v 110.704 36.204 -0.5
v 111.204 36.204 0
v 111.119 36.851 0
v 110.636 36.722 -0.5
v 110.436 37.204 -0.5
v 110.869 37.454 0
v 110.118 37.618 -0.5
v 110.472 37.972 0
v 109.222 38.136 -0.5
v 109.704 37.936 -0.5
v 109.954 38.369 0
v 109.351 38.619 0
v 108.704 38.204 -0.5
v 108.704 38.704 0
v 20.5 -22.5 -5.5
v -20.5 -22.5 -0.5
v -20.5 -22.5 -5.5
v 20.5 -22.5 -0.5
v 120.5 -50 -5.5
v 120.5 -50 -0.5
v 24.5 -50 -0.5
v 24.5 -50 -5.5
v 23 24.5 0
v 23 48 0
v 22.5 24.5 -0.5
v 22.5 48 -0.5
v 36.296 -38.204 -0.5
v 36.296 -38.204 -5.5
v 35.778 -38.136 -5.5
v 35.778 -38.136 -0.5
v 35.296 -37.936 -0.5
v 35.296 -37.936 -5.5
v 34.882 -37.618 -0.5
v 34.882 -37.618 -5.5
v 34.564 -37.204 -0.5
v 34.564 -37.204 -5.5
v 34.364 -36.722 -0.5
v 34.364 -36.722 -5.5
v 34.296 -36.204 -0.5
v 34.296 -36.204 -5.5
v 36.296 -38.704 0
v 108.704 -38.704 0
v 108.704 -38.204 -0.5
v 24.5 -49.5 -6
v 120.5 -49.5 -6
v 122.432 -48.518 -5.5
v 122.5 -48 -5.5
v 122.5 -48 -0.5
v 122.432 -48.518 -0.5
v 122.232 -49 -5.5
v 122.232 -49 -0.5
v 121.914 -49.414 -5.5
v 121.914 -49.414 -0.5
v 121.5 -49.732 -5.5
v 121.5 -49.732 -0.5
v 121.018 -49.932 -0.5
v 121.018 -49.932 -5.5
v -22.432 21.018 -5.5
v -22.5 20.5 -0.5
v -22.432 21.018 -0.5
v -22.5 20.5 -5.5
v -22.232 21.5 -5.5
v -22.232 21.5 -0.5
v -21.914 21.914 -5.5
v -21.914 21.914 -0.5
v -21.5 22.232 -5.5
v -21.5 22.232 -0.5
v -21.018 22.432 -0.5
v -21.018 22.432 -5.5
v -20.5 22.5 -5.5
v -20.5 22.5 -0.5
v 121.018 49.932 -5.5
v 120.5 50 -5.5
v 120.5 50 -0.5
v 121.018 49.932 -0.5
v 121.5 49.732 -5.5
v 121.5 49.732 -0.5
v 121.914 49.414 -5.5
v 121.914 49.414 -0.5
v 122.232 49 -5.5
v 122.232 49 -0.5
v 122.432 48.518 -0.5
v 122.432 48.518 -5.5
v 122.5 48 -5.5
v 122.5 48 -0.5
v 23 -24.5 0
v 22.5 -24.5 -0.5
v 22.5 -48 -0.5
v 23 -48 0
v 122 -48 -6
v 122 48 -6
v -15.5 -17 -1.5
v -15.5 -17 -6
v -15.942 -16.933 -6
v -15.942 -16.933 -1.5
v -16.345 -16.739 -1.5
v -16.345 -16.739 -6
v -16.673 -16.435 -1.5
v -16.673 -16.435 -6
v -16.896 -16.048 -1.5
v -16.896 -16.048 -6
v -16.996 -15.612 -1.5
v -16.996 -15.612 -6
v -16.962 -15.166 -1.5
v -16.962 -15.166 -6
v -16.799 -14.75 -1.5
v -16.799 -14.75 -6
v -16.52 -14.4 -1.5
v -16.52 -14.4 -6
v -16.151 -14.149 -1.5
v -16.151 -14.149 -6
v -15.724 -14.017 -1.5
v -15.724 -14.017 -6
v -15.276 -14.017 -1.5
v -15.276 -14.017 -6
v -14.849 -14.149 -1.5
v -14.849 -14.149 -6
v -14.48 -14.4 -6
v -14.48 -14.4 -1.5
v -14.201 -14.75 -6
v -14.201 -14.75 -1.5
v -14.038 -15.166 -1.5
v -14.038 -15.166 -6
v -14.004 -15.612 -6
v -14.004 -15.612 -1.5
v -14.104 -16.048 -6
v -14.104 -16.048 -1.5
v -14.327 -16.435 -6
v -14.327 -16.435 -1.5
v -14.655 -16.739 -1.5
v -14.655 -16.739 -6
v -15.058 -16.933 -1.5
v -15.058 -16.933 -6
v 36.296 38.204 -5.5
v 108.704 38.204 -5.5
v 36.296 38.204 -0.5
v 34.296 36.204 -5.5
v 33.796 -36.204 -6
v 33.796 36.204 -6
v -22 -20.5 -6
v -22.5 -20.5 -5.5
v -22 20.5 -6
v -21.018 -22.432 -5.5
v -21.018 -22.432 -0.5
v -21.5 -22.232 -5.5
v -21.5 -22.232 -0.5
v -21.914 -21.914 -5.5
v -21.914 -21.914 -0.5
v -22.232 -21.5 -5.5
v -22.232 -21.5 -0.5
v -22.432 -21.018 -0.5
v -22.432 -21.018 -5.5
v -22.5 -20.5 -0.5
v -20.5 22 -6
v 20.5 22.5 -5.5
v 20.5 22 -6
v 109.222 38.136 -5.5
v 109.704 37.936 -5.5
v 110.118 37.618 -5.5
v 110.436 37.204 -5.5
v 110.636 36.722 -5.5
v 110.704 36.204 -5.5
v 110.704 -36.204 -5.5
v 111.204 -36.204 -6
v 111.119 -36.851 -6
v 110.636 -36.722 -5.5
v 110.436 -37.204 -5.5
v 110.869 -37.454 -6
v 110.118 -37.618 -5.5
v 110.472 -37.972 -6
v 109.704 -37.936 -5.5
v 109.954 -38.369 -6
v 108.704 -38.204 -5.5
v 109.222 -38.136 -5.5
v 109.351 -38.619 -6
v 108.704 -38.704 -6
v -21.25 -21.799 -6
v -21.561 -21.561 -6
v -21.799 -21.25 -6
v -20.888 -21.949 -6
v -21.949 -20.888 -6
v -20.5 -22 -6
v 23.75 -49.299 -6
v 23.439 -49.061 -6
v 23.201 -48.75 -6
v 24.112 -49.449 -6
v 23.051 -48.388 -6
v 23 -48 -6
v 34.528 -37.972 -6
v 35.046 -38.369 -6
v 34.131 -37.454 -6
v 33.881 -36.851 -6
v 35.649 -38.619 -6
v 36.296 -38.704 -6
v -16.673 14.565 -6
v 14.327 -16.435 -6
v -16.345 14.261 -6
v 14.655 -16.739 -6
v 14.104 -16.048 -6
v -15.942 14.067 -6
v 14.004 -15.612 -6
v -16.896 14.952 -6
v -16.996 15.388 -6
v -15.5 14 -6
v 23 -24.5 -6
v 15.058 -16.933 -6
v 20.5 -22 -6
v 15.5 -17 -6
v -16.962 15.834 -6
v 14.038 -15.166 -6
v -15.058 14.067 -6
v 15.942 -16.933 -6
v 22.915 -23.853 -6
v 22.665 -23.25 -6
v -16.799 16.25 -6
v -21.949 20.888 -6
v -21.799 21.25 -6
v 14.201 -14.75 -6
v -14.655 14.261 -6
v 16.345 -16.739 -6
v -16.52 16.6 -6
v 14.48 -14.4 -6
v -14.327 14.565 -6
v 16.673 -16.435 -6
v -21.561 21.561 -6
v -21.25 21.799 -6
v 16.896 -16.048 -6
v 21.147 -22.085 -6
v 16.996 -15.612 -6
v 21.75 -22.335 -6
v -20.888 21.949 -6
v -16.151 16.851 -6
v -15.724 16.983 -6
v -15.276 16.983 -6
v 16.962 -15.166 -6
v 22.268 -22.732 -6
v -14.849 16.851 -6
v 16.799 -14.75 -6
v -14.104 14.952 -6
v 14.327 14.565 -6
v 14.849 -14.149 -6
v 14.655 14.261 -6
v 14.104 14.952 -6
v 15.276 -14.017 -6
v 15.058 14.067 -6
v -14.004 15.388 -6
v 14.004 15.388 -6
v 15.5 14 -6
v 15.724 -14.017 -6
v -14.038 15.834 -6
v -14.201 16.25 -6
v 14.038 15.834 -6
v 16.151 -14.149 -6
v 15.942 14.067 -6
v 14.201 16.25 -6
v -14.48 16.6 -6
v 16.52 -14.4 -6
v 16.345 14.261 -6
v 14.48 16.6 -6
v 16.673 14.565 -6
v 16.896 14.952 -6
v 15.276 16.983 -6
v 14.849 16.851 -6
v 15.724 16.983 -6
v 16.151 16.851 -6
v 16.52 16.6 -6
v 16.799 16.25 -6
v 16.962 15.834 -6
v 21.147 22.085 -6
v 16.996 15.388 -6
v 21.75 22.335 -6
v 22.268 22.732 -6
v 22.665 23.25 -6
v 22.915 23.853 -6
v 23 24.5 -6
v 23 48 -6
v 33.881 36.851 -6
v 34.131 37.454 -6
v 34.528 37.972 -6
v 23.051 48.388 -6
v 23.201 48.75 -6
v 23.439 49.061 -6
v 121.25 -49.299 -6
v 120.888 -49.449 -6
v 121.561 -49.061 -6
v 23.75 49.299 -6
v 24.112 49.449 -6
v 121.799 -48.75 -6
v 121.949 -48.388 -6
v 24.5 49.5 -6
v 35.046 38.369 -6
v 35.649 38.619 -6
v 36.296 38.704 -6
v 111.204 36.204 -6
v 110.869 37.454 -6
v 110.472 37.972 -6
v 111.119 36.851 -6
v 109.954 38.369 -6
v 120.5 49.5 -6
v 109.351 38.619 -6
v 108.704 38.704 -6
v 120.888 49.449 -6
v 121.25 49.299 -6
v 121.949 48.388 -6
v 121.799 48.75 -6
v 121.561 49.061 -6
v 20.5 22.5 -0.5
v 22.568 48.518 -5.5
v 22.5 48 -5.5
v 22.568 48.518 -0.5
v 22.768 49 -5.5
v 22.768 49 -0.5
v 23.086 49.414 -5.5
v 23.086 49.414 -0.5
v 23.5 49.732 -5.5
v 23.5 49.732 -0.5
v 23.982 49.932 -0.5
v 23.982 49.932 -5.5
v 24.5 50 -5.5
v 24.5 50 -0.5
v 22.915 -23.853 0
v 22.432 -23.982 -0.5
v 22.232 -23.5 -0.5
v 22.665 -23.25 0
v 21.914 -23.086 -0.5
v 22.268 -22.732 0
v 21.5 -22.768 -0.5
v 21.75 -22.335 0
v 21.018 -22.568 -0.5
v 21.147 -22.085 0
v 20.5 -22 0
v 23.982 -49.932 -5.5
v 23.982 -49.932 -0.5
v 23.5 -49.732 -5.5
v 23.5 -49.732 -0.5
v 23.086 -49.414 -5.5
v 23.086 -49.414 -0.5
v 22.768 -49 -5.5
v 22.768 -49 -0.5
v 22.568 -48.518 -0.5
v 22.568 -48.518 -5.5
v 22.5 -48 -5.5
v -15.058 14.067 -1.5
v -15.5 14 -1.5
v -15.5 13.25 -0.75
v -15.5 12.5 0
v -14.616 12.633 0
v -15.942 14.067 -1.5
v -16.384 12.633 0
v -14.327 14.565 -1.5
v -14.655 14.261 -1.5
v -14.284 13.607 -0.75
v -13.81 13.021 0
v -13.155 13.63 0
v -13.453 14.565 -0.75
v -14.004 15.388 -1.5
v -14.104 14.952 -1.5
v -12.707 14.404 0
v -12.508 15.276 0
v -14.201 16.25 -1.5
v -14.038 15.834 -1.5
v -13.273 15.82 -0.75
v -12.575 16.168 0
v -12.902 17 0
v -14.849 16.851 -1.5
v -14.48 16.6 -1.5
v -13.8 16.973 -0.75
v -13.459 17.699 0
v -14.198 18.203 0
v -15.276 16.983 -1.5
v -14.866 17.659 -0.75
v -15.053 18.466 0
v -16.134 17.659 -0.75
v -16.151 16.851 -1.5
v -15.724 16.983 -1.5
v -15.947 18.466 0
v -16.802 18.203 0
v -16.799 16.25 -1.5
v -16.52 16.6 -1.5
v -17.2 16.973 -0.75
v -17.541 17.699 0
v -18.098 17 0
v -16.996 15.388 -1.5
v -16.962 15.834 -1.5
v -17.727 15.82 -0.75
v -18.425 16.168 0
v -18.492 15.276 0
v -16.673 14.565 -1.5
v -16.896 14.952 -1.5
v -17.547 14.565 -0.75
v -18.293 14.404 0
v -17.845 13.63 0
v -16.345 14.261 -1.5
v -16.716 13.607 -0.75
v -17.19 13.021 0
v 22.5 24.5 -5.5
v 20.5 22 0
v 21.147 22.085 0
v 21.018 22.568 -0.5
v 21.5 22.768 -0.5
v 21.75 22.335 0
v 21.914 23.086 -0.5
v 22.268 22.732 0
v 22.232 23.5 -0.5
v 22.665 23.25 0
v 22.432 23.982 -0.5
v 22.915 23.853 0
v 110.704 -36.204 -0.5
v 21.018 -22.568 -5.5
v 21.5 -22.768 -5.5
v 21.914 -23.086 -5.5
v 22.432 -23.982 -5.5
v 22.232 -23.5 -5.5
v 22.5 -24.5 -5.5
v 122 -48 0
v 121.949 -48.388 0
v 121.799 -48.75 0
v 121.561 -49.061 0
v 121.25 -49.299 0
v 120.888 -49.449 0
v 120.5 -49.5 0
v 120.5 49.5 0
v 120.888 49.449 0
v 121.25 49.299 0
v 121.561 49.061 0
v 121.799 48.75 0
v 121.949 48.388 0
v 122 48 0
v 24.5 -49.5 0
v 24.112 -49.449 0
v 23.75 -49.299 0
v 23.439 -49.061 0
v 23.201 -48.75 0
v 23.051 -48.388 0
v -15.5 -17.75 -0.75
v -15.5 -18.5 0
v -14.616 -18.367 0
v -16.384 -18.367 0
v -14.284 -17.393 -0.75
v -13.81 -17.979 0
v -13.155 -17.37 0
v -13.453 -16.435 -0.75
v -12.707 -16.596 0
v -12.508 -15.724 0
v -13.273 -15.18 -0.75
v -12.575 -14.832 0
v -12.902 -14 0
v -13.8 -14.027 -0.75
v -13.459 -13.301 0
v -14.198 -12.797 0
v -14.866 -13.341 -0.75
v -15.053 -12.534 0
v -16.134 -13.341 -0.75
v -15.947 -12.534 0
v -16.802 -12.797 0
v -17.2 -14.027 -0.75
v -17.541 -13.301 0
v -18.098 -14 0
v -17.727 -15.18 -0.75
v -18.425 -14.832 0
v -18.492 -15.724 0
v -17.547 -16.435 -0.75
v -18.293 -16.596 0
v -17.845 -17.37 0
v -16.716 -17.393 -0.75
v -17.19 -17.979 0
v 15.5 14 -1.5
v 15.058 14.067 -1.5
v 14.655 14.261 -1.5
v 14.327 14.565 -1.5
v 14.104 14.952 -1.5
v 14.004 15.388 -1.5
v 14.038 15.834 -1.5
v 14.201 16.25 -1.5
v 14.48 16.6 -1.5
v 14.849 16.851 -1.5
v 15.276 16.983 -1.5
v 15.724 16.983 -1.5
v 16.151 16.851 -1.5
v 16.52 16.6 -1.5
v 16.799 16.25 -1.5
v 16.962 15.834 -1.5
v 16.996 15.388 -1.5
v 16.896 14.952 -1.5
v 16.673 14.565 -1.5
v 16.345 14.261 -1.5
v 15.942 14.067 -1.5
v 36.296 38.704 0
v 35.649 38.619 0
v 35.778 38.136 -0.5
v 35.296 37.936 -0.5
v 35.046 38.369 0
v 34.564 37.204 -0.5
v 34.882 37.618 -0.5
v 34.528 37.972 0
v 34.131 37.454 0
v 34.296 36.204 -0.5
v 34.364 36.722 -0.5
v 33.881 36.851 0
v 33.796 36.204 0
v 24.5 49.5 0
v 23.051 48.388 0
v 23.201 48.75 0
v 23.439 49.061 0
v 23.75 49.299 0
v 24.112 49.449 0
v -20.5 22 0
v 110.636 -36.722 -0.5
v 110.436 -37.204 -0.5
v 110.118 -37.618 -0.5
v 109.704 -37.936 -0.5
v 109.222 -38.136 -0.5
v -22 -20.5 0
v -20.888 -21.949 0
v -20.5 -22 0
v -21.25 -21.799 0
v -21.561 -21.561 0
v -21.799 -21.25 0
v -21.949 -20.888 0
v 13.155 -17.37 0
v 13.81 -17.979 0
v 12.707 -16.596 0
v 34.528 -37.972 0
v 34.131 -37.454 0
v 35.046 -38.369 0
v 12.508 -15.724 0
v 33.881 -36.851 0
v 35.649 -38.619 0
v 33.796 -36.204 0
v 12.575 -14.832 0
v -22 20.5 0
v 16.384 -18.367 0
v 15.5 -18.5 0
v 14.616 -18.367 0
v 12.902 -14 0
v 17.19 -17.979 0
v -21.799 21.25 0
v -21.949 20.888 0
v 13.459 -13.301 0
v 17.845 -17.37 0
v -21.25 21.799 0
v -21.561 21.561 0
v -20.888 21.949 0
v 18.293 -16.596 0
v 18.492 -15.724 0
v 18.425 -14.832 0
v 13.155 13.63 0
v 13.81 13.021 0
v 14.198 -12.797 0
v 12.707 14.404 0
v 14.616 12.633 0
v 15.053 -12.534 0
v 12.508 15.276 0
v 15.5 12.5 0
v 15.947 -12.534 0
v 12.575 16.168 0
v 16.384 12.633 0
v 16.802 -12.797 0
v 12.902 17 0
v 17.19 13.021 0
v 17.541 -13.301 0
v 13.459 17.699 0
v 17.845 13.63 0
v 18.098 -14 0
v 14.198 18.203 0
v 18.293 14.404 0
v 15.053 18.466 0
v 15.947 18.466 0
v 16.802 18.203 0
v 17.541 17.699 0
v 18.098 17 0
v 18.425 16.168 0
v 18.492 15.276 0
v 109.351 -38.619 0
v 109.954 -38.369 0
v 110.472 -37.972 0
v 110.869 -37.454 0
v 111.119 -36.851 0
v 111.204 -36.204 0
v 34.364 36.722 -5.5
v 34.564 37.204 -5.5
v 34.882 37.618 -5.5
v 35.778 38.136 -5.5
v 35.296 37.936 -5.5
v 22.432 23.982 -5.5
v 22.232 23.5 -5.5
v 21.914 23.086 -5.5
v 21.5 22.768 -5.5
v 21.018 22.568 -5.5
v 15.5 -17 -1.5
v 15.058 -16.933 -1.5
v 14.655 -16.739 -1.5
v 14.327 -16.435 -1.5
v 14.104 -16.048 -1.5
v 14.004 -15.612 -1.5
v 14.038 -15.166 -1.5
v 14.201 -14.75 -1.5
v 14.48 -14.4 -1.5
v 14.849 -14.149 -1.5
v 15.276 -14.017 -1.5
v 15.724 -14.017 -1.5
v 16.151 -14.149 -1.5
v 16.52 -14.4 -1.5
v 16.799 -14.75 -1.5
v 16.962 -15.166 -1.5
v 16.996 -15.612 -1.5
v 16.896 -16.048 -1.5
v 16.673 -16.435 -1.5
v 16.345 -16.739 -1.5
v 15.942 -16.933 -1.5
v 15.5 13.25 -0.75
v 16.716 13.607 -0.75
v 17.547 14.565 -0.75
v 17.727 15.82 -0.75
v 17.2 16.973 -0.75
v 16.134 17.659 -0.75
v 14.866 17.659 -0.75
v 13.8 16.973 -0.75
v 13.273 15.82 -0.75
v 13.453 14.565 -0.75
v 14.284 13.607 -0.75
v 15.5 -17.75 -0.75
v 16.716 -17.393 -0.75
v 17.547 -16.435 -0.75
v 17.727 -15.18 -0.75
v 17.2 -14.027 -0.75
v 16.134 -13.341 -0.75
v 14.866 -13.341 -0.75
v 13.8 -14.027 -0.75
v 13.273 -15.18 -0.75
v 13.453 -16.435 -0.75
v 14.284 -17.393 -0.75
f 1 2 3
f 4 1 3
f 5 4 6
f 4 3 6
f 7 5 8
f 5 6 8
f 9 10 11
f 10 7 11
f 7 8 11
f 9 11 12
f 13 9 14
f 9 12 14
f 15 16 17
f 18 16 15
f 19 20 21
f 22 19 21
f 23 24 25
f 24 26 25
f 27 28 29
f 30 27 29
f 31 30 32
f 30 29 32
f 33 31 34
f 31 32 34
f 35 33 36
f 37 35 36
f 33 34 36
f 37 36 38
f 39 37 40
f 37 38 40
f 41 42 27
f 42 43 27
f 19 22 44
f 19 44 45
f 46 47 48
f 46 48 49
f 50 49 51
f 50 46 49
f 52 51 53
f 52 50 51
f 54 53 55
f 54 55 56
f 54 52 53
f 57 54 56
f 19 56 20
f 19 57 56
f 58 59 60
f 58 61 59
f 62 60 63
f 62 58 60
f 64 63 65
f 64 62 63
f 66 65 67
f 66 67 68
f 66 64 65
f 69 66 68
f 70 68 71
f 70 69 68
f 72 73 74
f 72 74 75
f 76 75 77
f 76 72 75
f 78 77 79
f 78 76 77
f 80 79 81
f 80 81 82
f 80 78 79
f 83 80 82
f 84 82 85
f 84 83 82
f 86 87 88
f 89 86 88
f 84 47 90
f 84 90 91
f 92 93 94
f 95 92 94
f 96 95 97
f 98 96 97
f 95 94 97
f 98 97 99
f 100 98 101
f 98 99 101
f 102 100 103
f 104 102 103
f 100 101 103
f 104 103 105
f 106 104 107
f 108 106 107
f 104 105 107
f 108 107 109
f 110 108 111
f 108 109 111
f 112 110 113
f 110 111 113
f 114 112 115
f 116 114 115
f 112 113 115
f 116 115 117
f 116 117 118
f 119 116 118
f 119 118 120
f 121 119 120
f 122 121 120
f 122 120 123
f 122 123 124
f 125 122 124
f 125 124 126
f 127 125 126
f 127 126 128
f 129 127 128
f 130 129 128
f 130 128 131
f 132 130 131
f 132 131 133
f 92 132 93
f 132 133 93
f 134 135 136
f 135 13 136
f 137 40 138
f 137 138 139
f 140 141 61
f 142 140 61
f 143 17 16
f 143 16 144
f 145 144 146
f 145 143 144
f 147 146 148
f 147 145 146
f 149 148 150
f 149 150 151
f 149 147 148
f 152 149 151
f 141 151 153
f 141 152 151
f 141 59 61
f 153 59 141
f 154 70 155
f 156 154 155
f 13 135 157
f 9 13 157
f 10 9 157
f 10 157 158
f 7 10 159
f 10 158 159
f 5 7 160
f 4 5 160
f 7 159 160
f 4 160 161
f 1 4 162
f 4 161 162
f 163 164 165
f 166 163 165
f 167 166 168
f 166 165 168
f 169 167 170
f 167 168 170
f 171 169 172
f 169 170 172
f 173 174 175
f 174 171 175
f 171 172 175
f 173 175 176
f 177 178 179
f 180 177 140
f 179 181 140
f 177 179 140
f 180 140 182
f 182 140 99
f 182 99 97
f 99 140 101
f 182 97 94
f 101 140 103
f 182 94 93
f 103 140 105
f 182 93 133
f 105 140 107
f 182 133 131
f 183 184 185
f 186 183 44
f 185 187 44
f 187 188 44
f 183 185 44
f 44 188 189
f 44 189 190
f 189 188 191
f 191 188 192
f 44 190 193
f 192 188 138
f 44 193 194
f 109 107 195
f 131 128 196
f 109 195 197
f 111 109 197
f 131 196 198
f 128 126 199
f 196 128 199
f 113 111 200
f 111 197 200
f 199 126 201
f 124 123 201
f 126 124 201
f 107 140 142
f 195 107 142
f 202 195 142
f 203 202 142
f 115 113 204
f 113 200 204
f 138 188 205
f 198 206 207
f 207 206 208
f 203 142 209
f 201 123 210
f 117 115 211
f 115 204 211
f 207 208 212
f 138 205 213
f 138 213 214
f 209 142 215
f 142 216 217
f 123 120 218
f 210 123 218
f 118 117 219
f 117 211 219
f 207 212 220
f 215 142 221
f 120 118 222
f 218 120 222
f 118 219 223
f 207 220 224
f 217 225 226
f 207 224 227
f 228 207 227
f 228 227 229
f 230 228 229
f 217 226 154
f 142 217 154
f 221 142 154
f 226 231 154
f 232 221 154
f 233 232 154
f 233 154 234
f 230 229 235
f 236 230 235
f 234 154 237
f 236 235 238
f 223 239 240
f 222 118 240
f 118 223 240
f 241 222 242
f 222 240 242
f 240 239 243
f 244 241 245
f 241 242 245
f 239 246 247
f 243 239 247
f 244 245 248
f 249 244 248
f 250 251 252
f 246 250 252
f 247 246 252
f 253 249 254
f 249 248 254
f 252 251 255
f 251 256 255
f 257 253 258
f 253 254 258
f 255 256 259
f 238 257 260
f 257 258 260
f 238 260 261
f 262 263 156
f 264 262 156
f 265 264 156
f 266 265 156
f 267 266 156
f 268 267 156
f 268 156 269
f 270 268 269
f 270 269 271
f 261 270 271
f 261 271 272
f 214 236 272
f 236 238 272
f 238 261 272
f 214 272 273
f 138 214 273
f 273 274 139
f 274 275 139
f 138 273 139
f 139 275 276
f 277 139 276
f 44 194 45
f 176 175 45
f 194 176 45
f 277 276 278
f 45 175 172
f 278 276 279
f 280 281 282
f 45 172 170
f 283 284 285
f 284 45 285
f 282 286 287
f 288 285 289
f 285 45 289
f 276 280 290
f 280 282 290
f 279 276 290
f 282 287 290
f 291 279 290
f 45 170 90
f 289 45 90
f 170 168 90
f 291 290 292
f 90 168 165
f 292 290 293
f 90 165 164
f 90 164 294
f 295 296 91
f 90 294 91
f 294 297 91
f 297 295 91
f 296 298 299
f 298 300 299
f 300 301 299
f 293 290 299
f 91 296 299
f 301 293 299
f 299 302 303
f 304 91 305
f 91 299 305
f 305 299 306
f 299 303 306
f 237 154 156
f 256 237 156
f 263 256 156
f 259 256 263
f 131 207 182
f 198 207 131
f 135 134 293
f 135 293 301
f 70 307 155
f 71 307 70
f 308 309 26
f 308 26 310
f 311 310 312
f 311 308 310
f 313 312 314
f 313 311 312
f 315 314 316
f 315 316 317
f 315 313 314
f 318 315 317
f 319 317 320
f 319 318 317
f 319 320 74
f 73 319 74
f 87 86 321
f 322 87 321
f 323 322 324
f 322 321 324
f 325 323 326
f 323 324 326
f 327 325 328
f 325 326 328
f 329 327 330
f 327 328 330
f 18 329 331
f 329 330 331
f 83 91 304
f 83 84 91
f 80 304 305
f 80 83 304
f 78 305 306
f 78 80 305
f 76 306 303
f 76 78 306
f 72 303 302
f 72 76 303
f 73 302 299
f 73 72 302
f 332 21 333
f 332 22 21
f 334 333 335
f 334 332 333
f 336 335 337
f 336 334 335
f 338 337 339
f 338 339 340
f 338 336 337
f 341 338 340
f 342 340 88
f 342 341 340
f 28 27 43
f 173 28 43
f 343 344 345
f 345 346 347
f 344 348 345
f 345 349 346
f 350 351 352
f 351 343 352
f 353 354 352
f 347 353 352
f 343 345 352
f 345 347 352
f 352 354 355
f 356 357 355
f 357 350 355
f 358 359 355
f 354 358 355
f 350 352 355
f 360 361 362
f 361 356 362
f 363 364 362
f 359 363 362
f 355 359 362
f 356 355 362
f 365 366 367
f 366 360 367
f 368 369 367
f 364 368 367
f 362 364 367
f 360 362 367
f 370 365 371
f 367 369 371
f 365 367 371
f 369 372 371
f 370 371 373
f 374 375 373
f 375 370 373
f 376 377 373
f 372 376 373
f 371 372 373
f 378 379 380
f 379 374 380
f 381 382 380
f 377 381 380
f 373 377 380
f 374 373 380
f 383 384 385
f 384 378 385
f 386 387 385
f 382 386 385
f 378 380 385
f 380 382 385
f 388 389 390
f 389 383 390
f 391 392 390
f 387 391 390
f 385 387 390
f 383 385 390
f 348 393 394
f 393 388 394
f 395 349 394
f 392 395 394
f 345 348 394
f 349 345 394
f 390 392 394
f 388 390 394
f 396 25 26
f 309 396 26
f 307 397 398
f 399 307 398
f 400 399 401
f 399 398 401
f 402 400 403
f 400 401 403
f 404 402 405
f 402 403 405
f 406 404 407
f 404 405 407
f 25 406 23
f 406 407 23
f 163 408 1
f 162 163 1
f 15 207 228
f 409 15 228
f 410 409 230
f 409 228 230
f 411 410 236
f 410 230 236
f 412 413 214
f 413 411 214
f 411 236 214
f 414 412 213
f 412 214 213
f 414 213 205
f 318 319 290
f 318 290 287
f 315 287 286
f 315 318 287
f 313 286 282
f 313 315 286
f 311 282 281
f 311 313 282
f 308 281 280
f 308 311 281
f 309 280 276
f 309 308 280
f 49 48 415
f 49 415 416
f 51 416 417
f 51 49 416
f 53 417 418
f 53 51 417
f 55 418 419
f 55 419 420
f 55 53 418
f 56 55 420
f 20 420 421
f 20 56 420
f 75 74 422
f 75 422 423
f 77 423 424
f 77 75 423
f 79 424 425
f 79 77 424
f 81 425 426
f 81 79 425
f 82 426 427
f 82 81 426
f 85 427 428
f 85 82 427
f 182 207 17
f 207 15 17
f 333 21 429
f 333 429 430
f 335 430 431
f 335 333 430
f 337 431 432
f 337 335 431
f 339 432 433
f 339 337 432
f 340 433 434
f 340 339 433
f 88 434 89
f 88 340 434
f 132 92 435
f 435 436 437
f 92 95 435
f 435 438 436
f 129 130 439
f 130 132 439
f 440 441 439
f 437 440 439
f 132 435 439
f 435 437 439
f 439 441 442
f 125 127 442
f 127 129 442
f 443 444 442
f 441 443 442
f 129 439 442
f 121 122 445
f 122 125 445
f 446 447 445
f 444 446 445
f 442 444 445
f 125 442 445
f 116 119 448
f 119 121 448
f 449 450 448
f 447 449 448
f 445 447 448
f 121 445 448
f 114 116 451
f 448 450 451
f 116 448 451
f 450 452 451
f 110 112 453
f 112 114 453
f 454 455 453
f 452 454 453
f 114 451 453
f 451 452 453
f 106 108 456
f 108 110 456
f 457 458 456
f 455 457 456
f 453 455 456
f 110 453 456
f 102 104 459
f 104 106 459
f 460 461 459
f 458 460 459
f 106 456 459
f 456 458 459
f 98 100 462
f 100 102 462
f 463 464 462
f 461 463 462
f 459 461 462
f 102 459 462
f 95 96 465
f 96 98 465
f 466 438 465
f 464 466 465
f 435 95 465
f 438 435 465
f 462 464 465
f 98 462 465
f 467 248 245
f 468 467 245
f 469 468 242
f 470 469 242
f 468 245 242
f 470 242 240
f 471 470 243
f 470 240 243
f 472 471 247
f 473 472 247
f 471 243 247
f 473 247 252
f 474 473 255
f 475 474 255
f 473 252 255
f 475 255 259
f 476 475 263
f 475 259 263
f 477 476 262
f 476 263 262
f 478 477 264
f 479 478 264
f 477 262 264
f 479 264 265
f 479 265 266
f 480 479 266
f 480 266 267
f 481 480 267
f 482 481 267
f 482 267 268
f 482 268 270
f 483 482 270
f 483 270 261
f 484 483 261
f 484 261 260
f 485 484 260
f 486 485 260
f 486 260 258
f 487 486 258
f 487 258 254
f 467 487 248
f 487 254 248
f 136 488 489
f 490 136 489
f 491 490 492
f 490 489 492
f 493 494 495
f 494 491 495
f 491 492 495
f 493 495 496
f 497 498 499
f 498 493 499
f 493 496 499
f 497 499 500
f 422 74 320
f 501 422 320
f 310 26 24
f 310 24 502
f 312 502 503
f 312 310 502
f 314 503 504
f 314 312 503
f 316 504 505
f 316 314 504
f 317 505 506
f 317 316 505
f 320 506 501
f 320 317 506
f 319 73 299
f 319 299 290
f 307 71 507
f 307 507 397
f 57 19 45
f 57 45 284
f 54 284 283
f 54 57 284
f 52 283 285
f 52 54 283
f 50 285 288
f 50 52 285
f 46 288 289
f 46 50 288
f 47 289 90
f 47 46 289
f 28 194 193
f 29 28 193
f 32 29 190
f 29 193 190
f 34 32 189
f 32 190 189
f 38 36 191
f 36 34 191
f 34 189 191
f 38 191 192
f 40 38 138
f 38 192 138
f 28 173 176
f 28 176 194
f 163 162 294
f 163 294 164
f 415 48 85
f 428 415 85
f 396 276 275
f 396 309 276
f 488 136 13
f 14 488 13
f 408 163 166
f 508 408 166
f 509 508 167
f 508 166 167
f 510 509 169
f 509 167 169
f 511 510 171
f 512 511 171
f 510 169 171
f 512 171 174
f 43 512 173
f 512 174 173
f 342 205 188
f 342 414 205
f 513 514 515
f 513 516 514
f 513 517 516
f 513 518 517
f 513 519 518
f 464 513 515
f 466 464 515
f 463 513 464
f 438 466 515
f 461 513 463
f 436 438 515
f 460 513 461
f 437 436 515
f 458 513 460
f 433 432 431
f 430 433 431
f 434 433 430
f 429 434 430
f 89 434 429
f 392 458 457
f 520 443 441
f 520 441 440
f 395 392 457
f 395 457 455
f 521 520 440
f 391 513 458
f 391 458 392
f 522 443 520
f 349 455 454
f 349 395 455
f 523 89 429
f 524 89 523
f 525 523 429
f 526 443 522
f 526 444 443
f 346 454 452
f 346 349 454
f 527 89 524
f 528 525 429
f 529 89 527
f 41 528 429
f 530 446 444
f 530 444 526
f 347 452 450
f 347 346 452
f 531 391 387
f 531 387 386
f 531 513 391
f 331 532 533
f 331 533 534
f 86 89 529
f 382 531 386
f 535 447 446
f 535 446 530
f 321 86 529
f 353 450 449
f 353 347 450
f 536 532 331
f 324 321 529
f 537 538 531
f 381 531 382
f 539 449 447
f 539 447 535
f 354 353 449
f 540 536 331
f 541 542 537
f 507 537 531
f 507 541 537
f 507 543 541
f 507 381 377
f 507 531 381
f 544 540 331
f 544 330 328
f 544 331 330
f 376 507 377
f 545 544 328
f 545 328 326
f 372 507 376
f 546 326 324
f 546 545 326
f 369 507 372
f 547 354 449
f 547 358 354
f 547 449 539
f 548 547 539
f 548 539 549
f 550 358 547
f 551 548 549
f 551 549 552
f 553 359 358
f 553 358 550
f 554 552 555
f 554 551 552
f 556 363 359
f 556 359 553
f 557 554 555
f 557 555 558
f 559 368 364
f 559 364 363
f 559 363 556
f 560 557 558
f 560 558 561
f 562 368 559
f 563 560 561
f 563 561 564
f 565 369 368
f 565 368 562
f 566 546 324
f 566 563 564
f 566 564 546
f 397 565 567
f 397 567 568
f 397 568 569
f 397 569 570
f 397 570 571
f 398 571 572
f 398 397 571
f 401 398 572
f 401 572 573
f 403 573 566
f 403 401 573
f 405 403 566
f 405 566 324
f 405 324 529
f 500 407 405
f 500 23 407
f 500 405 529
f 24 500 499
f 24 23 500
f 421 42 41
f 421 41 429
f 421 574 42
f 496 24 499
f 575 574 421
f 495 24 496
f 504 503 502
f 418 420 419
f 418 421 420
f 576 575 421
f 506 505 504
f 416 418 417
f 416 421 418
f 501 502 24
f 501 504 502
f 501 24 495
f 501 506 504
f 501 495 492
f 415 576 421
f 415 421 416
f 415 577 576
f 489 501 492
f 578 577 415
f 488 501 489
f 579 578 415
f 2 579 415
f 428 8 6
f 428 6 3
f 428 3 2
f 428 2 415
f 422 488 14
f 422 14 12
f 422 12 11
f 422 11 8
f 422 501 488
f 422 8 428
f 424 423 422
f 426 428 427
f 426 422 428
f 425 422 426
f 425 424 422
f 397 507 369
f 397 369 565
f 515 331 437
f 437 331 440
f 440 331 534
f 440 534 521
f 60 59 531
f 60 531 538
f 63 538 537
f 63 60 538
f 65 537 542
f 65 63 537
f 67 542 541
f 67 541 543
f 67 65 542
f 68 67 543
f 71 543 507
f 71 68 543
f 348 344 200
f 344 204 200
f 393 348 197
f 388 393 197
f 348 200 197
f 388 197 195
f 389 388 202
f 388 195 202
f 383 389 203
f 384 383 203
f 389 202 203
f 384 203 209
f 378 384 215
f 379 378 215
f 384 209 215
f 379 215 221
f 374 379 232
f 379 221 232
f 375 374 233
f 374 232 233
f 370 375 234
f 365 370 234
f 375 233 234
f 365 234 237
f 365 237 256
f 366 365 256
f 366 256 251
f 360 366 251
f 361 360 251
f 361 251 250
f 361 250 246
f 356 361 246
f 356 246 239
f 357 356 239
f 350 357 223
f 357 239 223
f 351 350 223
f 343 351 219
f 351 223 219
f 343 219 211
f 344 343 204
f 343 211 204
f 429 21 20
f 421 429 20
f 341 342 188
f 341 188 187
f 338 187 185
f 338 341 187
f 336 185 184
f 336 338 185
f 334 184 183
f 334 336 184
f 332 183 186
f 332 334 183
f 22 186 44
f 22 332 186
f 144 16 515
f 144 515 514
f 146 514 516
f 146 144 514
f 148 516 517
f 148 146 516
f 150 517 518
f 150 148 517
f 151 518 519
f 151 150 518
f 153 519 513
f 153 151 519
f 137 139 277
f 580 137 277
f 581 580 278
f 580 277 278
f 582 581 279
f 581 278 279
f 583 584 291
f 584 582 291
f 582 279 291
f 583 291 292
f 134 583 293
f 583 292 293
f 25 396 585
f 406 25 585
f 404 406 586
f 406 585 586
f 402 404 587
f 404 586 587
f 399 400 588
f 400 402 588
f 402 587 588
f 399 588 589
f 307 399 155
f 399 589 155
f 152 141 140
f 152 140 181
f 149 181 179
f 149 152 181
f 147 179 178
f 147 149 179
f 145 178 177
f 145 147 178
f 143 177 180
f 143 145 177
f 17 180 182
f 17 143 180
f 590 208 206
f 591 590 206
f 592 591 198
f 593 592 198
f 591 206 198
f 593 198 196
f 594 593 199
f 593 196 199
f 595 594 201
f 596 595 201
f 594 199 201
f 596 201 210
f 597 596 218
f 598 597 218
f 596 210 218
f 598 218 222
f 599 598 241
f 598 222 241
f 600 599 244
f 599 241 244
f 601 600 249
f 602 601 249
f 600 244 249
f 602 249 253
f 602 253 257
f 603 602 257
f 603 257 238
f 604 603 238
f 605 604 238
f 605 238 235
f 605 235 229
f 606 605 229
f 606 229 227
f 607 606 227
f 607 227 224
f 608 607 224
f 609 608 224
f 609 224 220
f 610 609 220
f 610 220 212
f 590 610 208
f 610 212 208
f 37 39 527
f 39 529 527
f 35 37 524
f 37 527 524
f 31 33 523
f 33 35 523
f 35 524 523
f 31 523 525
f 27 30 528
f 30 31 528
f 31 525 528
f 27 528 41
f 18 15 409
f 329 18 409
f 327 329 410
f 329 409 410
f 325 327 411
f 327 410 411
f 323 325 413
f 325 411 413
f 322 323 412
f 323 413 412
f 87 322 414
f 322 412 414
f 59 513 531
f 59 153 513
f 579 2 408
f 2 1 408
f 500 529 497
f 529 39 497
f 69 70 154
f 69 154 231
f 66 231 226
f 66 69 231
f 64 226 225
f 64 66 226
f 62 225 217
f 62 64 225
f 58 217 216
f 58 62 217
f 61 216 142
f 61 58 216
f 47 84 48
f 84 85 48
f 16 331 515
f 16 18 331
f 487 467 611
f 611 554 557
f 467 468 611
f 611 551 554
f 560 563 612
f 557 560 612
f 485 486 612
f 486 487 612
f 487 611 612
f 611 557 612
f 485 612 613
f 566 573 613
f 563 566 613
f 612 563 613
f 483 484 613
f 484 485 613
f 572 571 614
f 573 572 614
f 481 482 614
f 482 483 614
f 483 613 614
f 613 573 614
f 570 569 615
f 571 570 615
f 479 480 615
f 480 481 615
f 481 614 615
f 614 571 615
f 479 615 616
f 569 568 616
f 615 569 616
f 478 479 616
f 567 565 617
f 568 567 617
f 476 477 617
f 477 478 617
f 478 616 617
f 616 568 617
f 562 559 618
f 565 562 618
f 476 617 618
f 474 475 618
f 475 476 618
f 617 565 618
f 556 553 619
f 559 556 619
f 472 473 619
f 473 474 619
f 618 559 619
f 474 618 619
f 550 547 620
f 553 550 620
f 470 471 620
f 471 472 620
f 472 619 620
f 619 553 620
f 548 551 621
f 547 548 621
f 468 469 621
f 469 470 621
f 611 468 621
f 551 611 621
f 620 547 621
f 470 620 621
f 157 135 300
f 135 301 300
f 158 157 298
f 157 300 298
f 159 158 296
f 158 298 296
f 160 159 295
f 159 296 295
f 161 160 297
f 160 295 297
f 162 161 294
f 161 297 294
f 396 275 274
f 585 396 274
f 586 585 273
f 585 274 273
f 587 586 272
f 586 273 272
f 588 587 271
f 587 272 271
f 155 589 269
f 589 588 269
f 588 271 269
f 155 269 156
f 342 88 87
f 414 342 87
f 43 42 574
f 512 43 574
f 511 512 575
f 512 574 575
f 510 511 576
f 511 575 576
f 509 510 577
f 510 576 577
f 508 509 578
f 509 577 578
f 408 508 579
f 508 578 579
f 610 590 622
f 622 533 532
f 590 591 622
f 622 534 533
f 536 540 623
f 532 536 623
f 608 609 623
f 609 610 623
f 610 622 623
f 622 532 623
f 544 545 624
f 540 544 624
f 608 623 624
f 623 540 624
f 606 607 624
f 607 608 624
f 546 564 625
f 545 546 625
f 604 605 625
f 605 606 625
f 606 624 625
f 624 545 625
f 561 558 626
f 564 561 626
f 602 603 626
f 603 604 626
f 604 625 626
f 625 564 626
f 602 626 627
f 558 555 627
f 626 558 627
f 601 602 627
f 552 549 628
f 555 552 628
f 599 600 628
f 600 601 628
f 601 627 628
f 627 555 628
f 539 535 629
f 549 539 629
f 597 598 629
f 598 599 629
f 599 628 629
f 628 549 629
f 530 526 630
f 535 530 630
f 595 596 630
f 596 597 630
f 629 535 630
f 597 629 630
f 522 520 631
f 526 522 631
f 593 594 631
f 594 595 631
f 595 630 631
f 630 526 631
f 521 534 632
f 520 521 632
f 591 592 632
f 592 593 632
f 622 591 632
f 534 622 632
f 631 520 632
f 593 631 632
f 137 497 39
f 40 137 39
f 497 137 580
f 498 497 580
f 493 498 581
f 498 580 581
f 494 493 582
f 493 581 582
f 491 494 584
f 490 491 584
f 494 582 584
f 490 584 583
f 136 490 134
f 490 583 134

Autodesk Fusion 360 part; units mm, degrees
sketch "Cuadrado 100x100" plane through (0, 0, 0) normal (0, 0, 1) x (1, 0, 0)
  line L0 (50, -50) -> (-50, -50)
  line L1 (-50, -50) -> (-50, 50)
  line L2 (-50, 50) -> (50, 50)
  line L3 (50, 50) -> (50, -50)
  line L4 (50, -50) -> (-50, 50) construction
  line L5 (-50, -50) -> (50, 50) construction
  dimension "d1" = 100
sketch "Sketch1" plane through (0, 0, 0) normal (0, 0, 1) x (1, 0, 0) in component "plate"
  line L0 (22.5, 22.5) -> (-22.5, 22.5)
  line L1 (-22.5, 22.5) -> (-22.5, -22.5)
  line L2 (-22.5, -22.5) -> (22.5, -22.5)
  line L3 (22.5, -22.5) -> (22.5, 22.5)
  line L4 (22.5, 22.5) -> (-22.5, -22.5) construction
  line L5 (-22.5, 22.5) -> (22.5, -22.5) construction
  line L6 (15.5, 15.5) -> (-15.5, 15.5)
  line L7 (-15.5, 15.5) -> (-15.5, -15.5)
  line L8 (-15.5, -15.5) -> (15.5, -15.5)
  line L9 (15.5, -15.5) -> (15.5, 15.5)
  line L10 (122.5, -50) -> (22.5, -50)
  line L11 (22.5, -50) -> (22.5, 50)
  line L12 (22.5, 50) -> (122.5, 50)
  line L13 (122.5, 50) -> (122.5, -50)
  line L14 (122.5, -50) -> (22.5, 50) construction
  line L15 (22.5, -50) -> (122.5, 50) construction
  line L16 (110.7039, 38.2039) -> (34.2961, 38.2039)
  line L17 (34.2961, 38.2039) -> (34.2961, -38.2039)
  line L18 (34.2961, -38.2039) -> (110.7039, -38.2039)
  line L19 (110.7039, -38.2039) -> (110.7039, 38.2039)
  line L20 (72.5, 0) -> (22.5, 0) construction
  point P0 (72.5, 0)
  point P1 (72.5, 0)
  dimension "d59" = 45
  dimension "d60" = 31
  dimension "d62" = 100
extrude "Extrude1" add sketch "Sketch1" against normal blind 6 contours L0 L1 L2 L3 L11 | L3 L10 L11 L12 L13 | L6 L7 L8 L9 in component "plate"
fillet "Fillet1" radius 2 14 edges at (-22.5, 22.5, -3) (-22.5, -22.5, -3) (22.5, 22.5, -3) (22.5, 50, -3) (122.5, 50, -3) (122.5, -50, -3) (22.5, -22.5, -3) (22.5, -50, -3) (22.5, -22.5, -3) (22.5, -50, -3) (34.2961, 38.2039, -3) (110.7039, 38.2039, -3) (110.7039, -38.2039, -3) (34.2961, -38.2039, -3) in component "plate"
chamfer "Chamfer1" distance 0.5 angle 45 48 edges at (122.5, 0, 0) (121.9142, -49.4142, 0) (72.5, -50, 0) (23.0858, -49.4142, 0) (22.5, -36.25, 0) (21.9142, -23.0858, 0) (0, -22.5, 0) (-21.9142, -21.9142, 0) (-22.5, 0, 0) (-21.9142, 21.9142, 0) (0, 22.5, 0) (21.9142, 23.0858, 0) (22.5, 36.25, 0) (23.0858, 49.4142, 0) (72.5, 50, 0) (121.9142, 49.4142, 0) (122.5, 0, -6) (121.9142, 49.4142, -6) (72.5, 50, -6) (23.0858, 49.4142, -6) (22.5, 36.25, -6) (21.9142, 23.0858, -6) (0, 22.5, -6) (-21.9142, 21.9142, -6) (-22.5, 0, -6) (-21.9142, -21.9142, -6) (0, -22.5, -6) (21.9142, -23.0858, -6) (22.5, -36.25, -6) (23.0858, -49.4142, -6) (72.5, -50, -6) (121.9142, -49.4142, -6) (34.8819, 37.6181, -6) (34.2961, 0, -6) (34.8819, -37.6181, -6) (72.5, -38.2039, -6) (110.1181, -37.6181, -6) (110.7039, 0, -6) (110.1181, 37.6181, -6) (72.5, 38.2039, -6) (110.1181, 37.6181, 0) (110.7039, 0, 0) (110.1181, -37.6181, 0) (72.5, -38.2039, 0) (34.8819, -37.6181, 0) (34.2961, 0, 0) (34.8819, 37.6181, 0) (72.5, 38.2039, 0) in component "plate"
hole "Hole1" at (15.5, 15.5, 0) at (-15.5, 15.5, 0) at (-15.5, -15.5, 0) at (15.5, -15.5, 0) direction (0, 0, -1) diameter 3 end through all countersink diameter 6 countersink angle 90 in component "plate"
component "plate" placed x (1, 0, 0) y (0, 1, 0) z (0, 0, 1) at (0, 0, 0)
equation "offsetI3dDiam = 0.2 mm"
equation "offsetI3dRad = offsetI3dDiam / 2"
